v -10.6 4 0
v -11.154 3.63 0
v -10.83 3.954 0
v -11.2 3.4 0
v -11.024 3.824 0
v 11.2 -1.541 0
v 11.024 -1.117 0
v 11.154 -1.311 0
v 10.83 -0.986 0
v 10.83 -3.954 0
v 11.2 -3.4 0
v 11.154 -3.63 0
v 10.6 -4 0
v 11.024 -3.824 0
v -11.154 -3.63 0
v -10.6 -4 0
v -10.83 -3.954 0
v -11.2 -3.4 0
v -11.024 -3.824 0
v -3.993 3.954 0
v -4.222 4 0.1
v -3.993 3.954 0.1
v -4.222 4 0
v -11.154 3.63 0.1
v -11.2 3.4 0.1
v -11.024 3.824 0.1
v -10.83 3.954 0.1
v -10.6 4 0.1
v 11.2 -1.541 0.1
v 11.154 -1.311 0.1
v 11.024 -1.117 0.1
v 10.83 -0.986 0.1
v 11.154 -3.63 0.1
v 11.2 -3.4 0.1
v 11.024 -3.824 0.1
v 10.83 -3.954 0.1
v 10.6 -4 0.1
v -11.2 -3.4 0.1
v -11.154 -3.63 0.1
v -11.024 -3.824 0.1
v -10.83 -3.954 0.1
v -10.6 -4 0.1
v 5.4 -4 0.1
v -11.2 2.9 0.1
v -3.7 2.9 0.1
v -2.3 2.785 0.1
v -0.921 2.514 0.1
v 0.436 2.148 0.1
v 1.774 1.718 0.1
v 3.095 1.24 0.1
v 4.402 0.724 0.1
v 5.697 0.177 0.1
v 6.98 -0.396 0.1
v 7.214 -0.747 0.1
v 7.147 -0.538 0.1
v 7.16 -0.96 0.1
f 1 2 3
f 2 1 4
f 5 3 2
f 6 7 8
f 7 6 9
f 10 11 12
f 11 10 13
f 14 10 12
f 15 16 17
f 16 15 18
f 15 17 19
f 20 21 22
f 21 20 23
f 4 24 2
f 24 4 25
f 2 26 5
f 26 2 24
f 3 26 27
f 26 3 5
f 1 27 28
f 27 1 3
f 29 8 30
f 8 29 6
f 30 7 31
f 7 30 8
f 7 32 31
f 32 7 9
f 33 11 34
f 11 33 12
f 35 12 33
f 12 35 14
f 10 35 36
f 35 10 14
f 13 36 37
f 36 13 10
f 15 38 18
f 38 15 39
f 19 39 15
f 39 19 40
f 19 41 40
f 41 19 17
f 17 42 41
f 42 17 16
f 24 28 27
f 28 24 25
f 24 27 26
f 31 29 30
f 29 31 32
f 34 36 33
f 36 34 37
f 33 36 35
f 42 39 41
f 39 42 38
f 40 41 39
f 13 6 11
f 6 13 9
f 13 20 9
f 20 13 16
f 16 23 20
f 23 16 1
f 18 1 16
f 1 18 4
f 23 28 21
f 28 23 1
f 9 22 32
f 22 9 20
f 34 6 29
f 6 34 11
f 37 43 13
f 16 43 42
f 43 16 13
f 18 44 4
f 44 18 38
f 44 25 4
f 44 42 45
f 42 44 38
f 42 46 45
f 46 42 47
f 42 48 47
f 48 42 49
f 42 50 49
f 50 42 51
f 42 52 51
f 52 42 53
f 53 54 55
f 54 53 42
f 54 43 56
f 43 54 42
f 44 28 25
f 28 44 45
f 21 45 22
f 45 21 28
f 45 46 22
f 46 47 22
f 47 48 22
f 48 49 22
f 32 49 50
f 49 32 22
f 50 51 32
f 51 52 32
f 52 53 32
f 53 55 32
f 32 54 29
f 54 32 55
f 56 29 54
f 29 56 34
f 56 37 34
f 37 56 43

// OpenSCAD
// file: ../p/empty.scad
use <../lib.scad>
function ldraw_lib__empty() = [
// 0 Empty
// 0 Name: empty.dat
// 0 Author: Steffen [Steffen]
// 0 !LDRAW_ORG Primitive UPDATE 2015-01
// 0 !LICENSE Licensed under CC BY 4.0 : see CAreadme.txt
// 
// 0 BFC CERTIFY CCW
  [0,"BFC","CERTIFY"],
  [0,"BFC","CCW"],
// 
// 0 !HISTORY 2015-10-11 [PTadmin] Official Update 2015-01
// 
// 
// 0 // Tool MLCad cannot handle really empty files. This file is used as a workaround.
// 0 // It exceptionally contains forbidden non-LDRAW standard syntax to satisfy MLCad until it is fixed OR a different editor has become the de-facto LDRAW standard.
// 0 // The line being used here is an "impossible" conditional line which never should be visible,
// 0 // additionally hidden by a syntax explicitly hiding it from displaying.
// 
// 0 MLCAD HIDE 5 24 0 0 0 0.0001 0 0 0.0001 -0.0001 0 0 0 0
];
module ldraw_lib__empty(step=0, col=false, unit=2/5, alt=false, line=0.2, solid=!$preview)
    makepoly(ldraw_lib__empty(), step=step, col=col, unit=unit, alt=alt, line=line, solid=solid);
ldraw_lib__empty(line=0.2);
// file: ../p/3-16cyli.scad
use <../lib.scad>
function ldraw_lib__3_16cyli() = [
// 0 Cylinder 0.1875
// 0 Name: 3-16cyli.dat
// 0 Author: Mark Kennedy [mkennedy]
// 0 !LDRAW_ORG Primitive UPDATE 2005-01
// 0 !LICENSE Licensed under CC BY 4.0 : see CAreadme.txt
// 
// 0 BFC CERTIFY CCW
  [0,"BFC","CERTIFY"],
  [0,"BFC","CCW"],
// 
// 0 !HISTORY 2004-03-02 [PTadmin] Official Update 2004-01
// 0 !HISTORY 2004-12-11 [nielsk] Recreated using Primitive Generator, Edge lines fixed, BFC changed to CCW
// 0 !HISTORY 2005-12-28 [PTadmin] Official Update 2005-01
// 0 !HISTORY 2007-06-24 [PTadmin] Header formatted for Contributor Agreement
// 0 !HISTORY 2008-07-01 [PTadmin] Official Update 2008-01
// 
// 
// 4 16 .9239 1 .3827 .9239 0 .3827 1 0 0 1 1 0
  [4,16,.9239,1,.3827,.9239,0,.3827,1,0,0,1,1,0],
// 4 16 .7071 1 .7071 .7071 0 .7071 .9239 0 .3827 .9239 1 .3827
  [4,16,.7071,1,.7071,.7071,0,.7071,.9239,0,.3827,.9239,1,.3827],
// 4 16 .3827 1 .9239 .3827 0 .9239 .7071 0 .7071 .7071 1 .7071
  [4,16,.3827,1,.9239,.3827,0,.9239,.7071,0,.7071,.7071,1,.7071],
// 5 24 1 1 0 1 0 0 1 1 -.4142 .9239 1 .3827
  [5,24,1,1,0,1,0,0,1,1,-.4142,.9239,1,.3827],
// 5 24 .9239 1 .3827 .9239 0 .3827 1 1 0 .7071 1 .7071
  [5,24,.9239,1,.3827,.9239,0,.3827,1,1,0,.7071,1,.7071],
// 5 24 .7071 1 .7071 .7071 0 .7071 .9239 1 .3827 .3827 1 .9239
  [5,24,.7071,1,.7071,.7071,0,.7071,.9239,1,.3827,.3827,1,.9239],
// 5 24 .3827 1 .9239 .3827 0 .9239 .7071 1 .7071 0 1 1.0824
  [5,24,.3827,1,.9239,.3827,0,.9239,.7071,1,.7071,0,1,1.0824],
// 0
];
module ldraw_lib__3_16cyli(step=0, col=false, unit=2/5, alt=false, line=0.2, solid=!$preview)
    makepoly(ldraw_lib__3_16cyli(), step=step, col=col, unit=unit, alt=alt, line=line, solid=solid);
ldraw_lib__3_16cyli(line=0.2);
// file: ../p/3-16chrd.scad
use <../lib.scad>
function ldraw_lib__3_16chrd() = [
// 0 Chord 0.1875
// 0 Name: 3-16chrd.dat
// 0 Author: Niels Karsdorp [nielsk]
// 0 !LDRAW_ORG Primitive UPDATE 2009-01
// 0 !LICENSE Licensed under CC BY 4.0 : see CAreadme.txt
// 
// 0 BFC CERTIFY CCW
  [0,"BFC","CERTIFY"],
  [0,"BFC","CCW"],
// 
// 0 !HISTORY 2009-05-02 [PTadmin] Official Update 2009-01
// 
// 
// 4 16 1 0 0 0.9239 0 0.3827 0.7071 0 0.7071 0.3827 0 0.9239
  [4,16,1,0,0,0.9239,0,0.3827,0.7071,0,0.7071,0.3827,0,0.9239],
// 0
// 
];
module ldraw_lib__3_16chrd(step=0, col=false, unit=2/5, alt=false, line=0.2, solid=!$preview)
    makepoly(ldraw_lib__3_16chrd(), step=step, col=col, unit=unit, alt=alt, line=line, solid=solid);
ldraw_lib__3_16chrd(line=0.2);
// file: ../p/1-4cyli.scad
use <../lib.scad>
function ldraw_lib__1_4cyli() = [
// 0 Cylinder 0.25
// 0 Name: 1-4cyli.dat
// 0 Author: James Jessiman
// 0 !LDRAW_ORG Primitive UPDATE 2012-01
// 0 !LICENSE Licensed under CC BY 4.0 : see CAreadme.txt
// 
// 0 BFC CERTIFY CCW
  [0,"BFC","CERTIFY"],
  [0,"BFC","CCW"],
// 
// 0 !HISTORY 2002-03-23 [sbliss] Added BFC statement.
// 0 !HISTORY 2002-04-25 [PTadmin] Official Update 2002-02
// 0 !HISTORY 2007-06-22 [PTadmin] Header formatted for Contributor Agreement
// 0 !HISTORY 2008-07-01 [PTadmin] Official Update 2008-01
// 0 !HISTORY 2012-02-16 [Philo] Changed to CCW
// 0 !HISTORY 2012-03-30 [PTadmin] Official Update 2012-01
// 
// 
// 4 16 1 1 0 0.9239 1 0.3827 0.9239 0 0.3827 1 0 0
  [4,16,1,1,0,0.9239,1,0.3827,0.9239,0,0.3827,1,0,0],
// 5 24 1 0 0 1 1 0 0.9239 0 0.3827 1 0 -1
  [5,24,1,0,0,1,1,0,0.9239,0,0.3827,1,0,-1],
// 4 16 0.9239 1 0.3827 0.7071 1 0.7071 0.7071 0 0.7071 0.9239 0 0.3827
  [4,16,0.9239,1,0.3827,0.7071,1,0.7071,0.7071,0,0.7071,0.9239,0,0.3827],
// 5 24 0.9239 0 0.3827 0.9239 1 0.3827 0.7071 0 0.7071 1 0 0
  [5,24,0.9239,0,0.3827,0.9239,1,0.3827,0.7071,0,0.7071,1,0,0],
// 4 16 0.7071 1 0.7071 0.3827 1 0.9239 0.3827 0 0.9239 0.7071 0 0.7071
  [4,16,0.7071,1,0.7071,0.3827,1,0.9239,0.3827,0,0.9239,0.7071,0,0.7071],
// 5 24 0.7071 0 0.7071 0.7071 1 0.7071 0.3827 0 0.9239 0.9239 0 0.3827
  [5,24,0.7071,0,0.7071,0.7071,1,0.7071,0.3827,0,0.9239,0.9239,0,0.3827],
// 4 16 0.3827 1 0.9239 0 1 1 0 0 1 0.3827 0 0.9239
  [4,16,0.3827,1,0.9239,0,1,1,0,0,1,0.3827,0,0.9239],
// 5 24 0.3827 0 0.9239 0.3827 1 0.9239 0 0 1 0.7071 0 0.7071
  [5,24,0.3827,0,0.9239,0.3827,1,0.9239,0,0,1,0.7071,0,0.7071],
// 5 24 0 0 1 0 1 1 0.3827 0 0.9239 -1 0 1
  [5,24,0,0,1,0,1,1,0.3827,0,0.9239,-1,0,1],
];
module ldraw_lib__1_4cyli(step=0, col=false, unit=2/5, alt=false, line=0.2, solid=!$preview)
    makepoly(ldraw_lib__1_4cyli(), step=step, col=col, unit=unit, alt=alt, line=line, solid=solid);
ldraw_lib__1_4cyli(line=0.2);
// file: ../p/1-4chrd.scad
use <../lib.scad>
function ldraw_lib__1_4chrd() = [
// 0 Chord 0.25
// 0 Name: 1-4chrd.dat
// 0 Author: Max Martin Richter [MMR1988]
// 0 !LDRAW_ORG Primitive UPDATE 2023-05
// 0 !LICENSE Licensed under CC BY 4.0 : see CAreadme.txt
// 
// 0 BFC CERTIFY CCW
  [0,"BFC","CERTIFY"],
  [0,"BFC","CCW"],
// 
// 0 !HISTORY 2004-04-22 [PTadmin] Official Update 2004-02
// 0 !HISTORY 2007-10-09 [PTadmin] Header formatted for Contributor Agreement
// 0 !HISTORY 2008-07-01 [PTadmin] Official Update 2008-01
// 0 !HISTORY 2012-08-02 [MMR1988] Re-creation with PrimGen2 and Rectifier
// 0 !HISTORY 2012-08-09 [PTadmin] Official Update 2012-02
// 0 !HISTORY 2023-10-27 [OrionP] Change author to MMR1988 from hafhead
// 0 !HISTORY 2023-10-31 [OrionP] Official Update 2023-05
// 
// 4 16 0.9239 0 0.3827 0.3827 0 0.9239 0 0 1 1 0 0
  [4,16,0.9239,0,0.3827,0.3827,0,0.9239,0,0,1,1,0,0],
// 3 16 0.7071 0 0.7071 0.3827 0 0.9239 0.9239 0 0.3827
  [3,16,0.7071,0,0.7071,0.3827,0,0.9239,0.9239,0,0.3827],
];
module ldraw_lib__1_4chrd(step=0, col=false, unit=2/5, alt=false, line=0.2, solid=!$preview)
    makepoly(ldraw_lib__1_4chrd(), step=step, col=col, unit=unit, alt=alt, line=line, solid=solid);
ldraw_lib__1_4chrd(line=0.2);
// file: ../p/1-16cyli.scad
use <../lib.scad>
function ldraw_lib__1_16cyli() = [
// 0 Cylinder 0.0625
// 0 Name: 1-16cyli.dat
// 0 Author: Marc Klein [marckl]
// 0 !LDRAW_ORG Primitive UPDATE 2005-01
// 0 !LICENSE Licensed under CC BY 4.0 : see CAreadme.txt
// 
// 0 BFC CERTIFY CCW
  [0,"BFC","CERTIFY"],
  [0,"BFC","CCW"],
// 
// 0 !HISTORY 2004-03-02 [PTadmin] Official Update 2004-01
// 0 !HISTORY 2004-12-11 [nielsk] Recreated using Primitive Generator, Edge lines fixed, BFC changed to CCW
// 0 !HISTORY 2005-12-28 [PTadmin] Official Update 2005-01
// 0 !HISTORY 2007-06-22 [PTadmin] Header formatted for Contributor Agreement
// 0 !HISTORY 2008-07-01 [PTadmin] Official Update 2008-01
// 
// 
// 4 16 .9239 1 .3827 .9239 0 .3827 1 0 0 1 1 0
  [4,16,.9239,1,.3827,.9239,0,.3827,1,0,0,1,1,0],
// 5 24 1 1 0 1 0 0 1 1 -.4142 .9239 1 .3827
  [5,24,1,1,0,1,0,0,1,1,-.4142,.9239,1,.3827],
// 5 24 .9239 1 .3827 .9239 0 .3827 1 1 0 .7654 1 .7654
  [5,24,.9239,1,.3827,.9239,0,.3827,1,1,0,.7654,1,.7654],
// 0
];
module ldraw_lib__1_16cyli(step=0, col=false, unit=2/5, alt=false, line=0.2, solid=!$preview)
    makepoly(ldraw_lib__1_16cyli(), step=step, col=col, unit=unit, alt=alt, line=line, solid=solid);
ldraw_lib__1_16cyli(line=0.2);
// file: ../p/1-16chrd.scad
use <../lib.scad>
use <empty.scad>
function ldraw_lib__1_16chrd() = [
// 0 Chord 0.0625
// 0 Name: 1-16chrd.dat
// 0 Author: Philippe Hurbain [Philo]
// 0 !LDRAW_ORG Primitive UPDATE 2015-01
// 0 !LICENSE Licensed under CC BY 4.0 : see CAreadme.txt
// 
// 0 BFC CERTIFY CCW
  [0,"BFC","CERTIFY"],
  [0,"BFC","CCW"],
// 
// 0 !HISTORY 2015-10-11 [PTadmin] Official Update 2015-01
// 
// 
// 0 // This file is intentionally empty because at the current \P resolution,
// 0 // an 1-16chrd is actually empty. However, this file still is present
// 0 // to allow tools to do primitives substition and fill in a real chrd here,
// 0 // or, if desired, to substitute this with the hi-res 48\1-16chrd.
// 
// 0 // This file is based on an idea by Darats at http://forums.ldraw.org/read.php?19,14500,14500#msg-14500
// 
// 1 16 0 0 0 1 0 0 0 1 0 0 0 1 empty.dat
  [1,16,0,0,0,1,0,0,0,1,0,0,0,1, ldraw_lib__empty()],
];
module ldraw_lib__1_16chrd(step=0, col=false, unit=2/5, alt=false, line=0.2, solid=!$preview)
    makepoly(ldraw_lib__1_16chrd(), step=step, col=col, unit=unit, alt=alt, line=line, solid=solid);
ldraw_lib__1_16chrd(line=0.2);
// file: 6141955q.scad
use <../lib.scad>
use <../p/1-16chrd.scad>
use <../p/1-16cyli.scad>
use <../p/1-4chrd.scad>
use <../p/1-4cyli.scad>
use <../p/3-16chrd.scad>
use <../p/3-16cyli.scad>
function ldraw_lib__6141955q() = [
// 0 Sticker  1 x  2.8 with Black Trapezoid on Blue Background Right
// 0 Name: 6141955q.dat
// 0 Author: Massimo Maso [Sirio]
// 0 !LDRAW_ORG Part UPDATE 2025-03
// 0 !LICENSE Licensed under CC BY 4.0 : see CAreadme.txt
// 
// 0 BFC CERTIFY CCW
  [0,"BFC","CERTIFY"],
  [0,"BFC","CCW"],
// 
// 0 !KEYWORDS Bricklink 75871stk01a, Brickowl 197362, Ford, GT, Mustang
// 0 !KEYWORDS Rebrickable 24746, Set 75871, Speed Champions
// 
// 0 !HISTORY 2025-03-30 [OrionP] Official Update 2025-03
// 
// 0 // Primitives
// 1 16 10.55615 0 8.5 0 0 -1.5 0 -1 0 1.5 0 0 1-16chrd.dat
  [1,16,10.55615,0,8.5,0,0,-1.5,0,-1,0,1.5,0,0, ldraw_lib__1_16chrd()],
// 1 16 26.5 0 8.5 1.5 0 0 0 -1 0 0 0 1.5 1-4chrd.dat
  [1,16,26.5,0,8.5,1.5,0,0,0,-1,0,0,0,1.5, ldraw_lib__1_4chrd()],
// 1 16 -26.5 0 -3.85205 -1.5 0 0 0 -1 0 0 0 1.5 3-16chrd.dat
  [1,16,-26.5,0,-3.85205,-1.5,0,0,0,-1,0,0,0,1.5, ldraw_lib__3_16chrd()],
// 1 16 -26.5 0 -8.5 -1.5 0 0 0 -1 0 0 0 -1.5 1-4chrd.dat
  [1,16,-26.5,0,-8.5,-1.5,0,0,0,-1,0,0,0,-1.5, ldraw_lib__1_4chrd()],
// 1 16 26.5 0 -8.5 1.5 0 0 0 -1 0 0 0 -1.5 1-4chrd.dat
  [1,16,26.5,0,-8.5,1.5,0,0,0,-1,0,0,0,-1.5, ldraw_lib__1_4chrd()],
// 1 16 10.55615 0 8.5 0 0 -1.5 0 -.25 0 1.5 0 0 1-16cyli.dat
  [1,16,10.55615,0,8.5,0,0,-1.5,0,-.25,0,1.5,0,0, ldraw_lib__1_16cyli()],
// 1 16 26.5 0 8.5 1.5 0 0 0 -.25 0 0 0 1.5 1-4cyli.dat
  [1,16,26.5,0,8.5,1.5,0,0,0,-.25,0,0,0,1.5, ldraw_lib__1_4cyli()],
// 1 16 -26.5 0 -3.85205 -1.5 0 0 0 -.25 0 0 0 1.5 3-16cyli.dat
  [1,16,-26.5,0,-3.85205,-1.5,0,0,0,-.25,0,0,0,1.5, ldraw_lib__3_16cyli()],
// 1 16 -26.5 0 -8.5 -1.5 0 0 0 -.25 0 0 0 -1.5 1-4cyli.dat
  [1,16,-26.5,0,-8.5,-1.5,0,0,0,-.25,0,0,0,-1.5, ldraw_lib__1_4cyli()],
// 1 16 26.5 0 -8.5 1.5 0 0 0 -.25 0 0 0 -1.5 1-4cyli.dat
  [1,16,26.5,0,-8.5,1.5,0,0,0,-.25,0,0,0,-1.5, ldraw_lib__1_4cyli()],
// 1 1 10.55615 -.25 8.5 0 0 -1.5 0 1 0 1.5 0 0 1-16chrd.dat
  [1,1,10.55615,-.25,8.5,0,0,-1.5,0,1,0,1.5,0,0, ldraw_lib__1_16chrd()],
// 1 1 26.5 -.25 8.5 1.5 0 0 0 1 0 0 0 1.5 1-4chrd.dat
  [1,1,26.5,-.25,8.5,1.5,0,0,0,1,0,0,0,1.5, ldraw_lib__1_4chrd()],
// 1 1 -26.5 -.25 -3.85205 -1.5 0 0 0 1 0 0 0 1.5 3-16chrd.dat
  [1,1,-26.5,-.25,-3.85205,-1.5,0,0,0,1,0,0,0,1.5, ldraw_lib__3_16chrd()],
// 1 1 -26.5 -.25 -8.5 -1.5 0 0 0 1 0 0 0 -1.5 1-4chrd.dat
  [1,1,-26.5,-.25,-8.5,-1.5,0,0,0,1,0,0,0,-1.5, ldraw_lib__1_4chrd()],
// 1 0 26.5 -.25 -8.5 1.5 0 0 0 1 0 0 0 -1.5 1-4chrd.dat
  [1,0,26.5,-.25,-8.5,1.5,0,0,0,1,0,0,0,-1.5, ldraw_lib__1_4chrd()],
// 0 // Bottom face
// 4 16 -26.5 0 -10 -28 0 -8.5 -28 0 -3.85205 -27.07405 0 -2.4662
  [4,16,-26.5,0,-10,-28,0,-8.5,-28,0,-3.85205,-27.07405,0,-2.4662],
// 4 16 -26.5 0 -10 -27.07405 0 -2.4662 9.9821 0 9.88585 26.5 0 -10
  [4,16,-26.5,0,-10,-27.07405,0,-2.4662,9.9821,0,9.88585,26.5,0,-10],
// 4 16 26.5 0 -10 9.9821 0 9.88585 10.55615 0 10 26.5 0 10
  [4,16,26.5,0,-10,9.9821,0,9.88585,10.55615,0,10,26.5,0,10],
// 4 16 26.5 0 -10 26.5 0 10 28 0 8.5 28 0 -8.5
  [4,16,26.5,0,-10,26.5,0,10,28,0,8.5,28,0,-8.5],
// 0 // Lateral face
// 4 16 26.5 0 10 10.55615 0 10 10.55615 -.25 10 26.5 -.25 10
  [4,16,26.5,0,10,10.55615,0,10,10.55615,-.25,10,26.5,-.25,10],
// 4 16 9.9821 0 9.88585 -27.07405 0 -2.4662 -27.07405 -.25 -2.4662 9.9821 -.25 9.88585
  [4,16,9.9821,0,9.88585,-27.07405,0,-2.4662,-27.07405,-.25,-2.4662,9.9821,-.25,9.88585],
// 4 16 -28 0 -3.85205 -28 0 -8.5 -28 -.25 -8.5 -28 -.25 -3.85205
  [4,16,-28,0,-3.85205,-28,0,-8.5,-28,-.25,-8.5,-28,-.25,-3.85205],
// 3 16 -26.5 0 -10 -13.5 -.25 -10 -26.5 -.25 -10
  [3,16,-26.5,0,-10,-13.5,-.25,-10,-26.5,-.25,-10],
// 4 16 -26.5 0 -10 26.5 0 -10 26.5 -.25 -10 -13.5 -.25 -10
  [4,16,-26.5,0,-10,26.5,0,-10,26.5,-.25,-10,-13.5,-.25,-10],
// 4 16 28 0 8.5 28 -.25 7.25 28 -.25 -8.5 28 0 -8.5
  [4,16,28,0,8.5,28,-.25,7.25,28,-.25,-8.5,28,0,-8.5],
// 3 16 28 0 8.5 28 -.25 8.5 28 -.25 7.25
  [3,16,28,0,8.5,28,-.25,8.5,28,-.25,7.25],
// 0 // Conditional lines
// 5 24 9.9821 -.25 9.8859 9.9821 0 9.8859 10.5562 -.25 10 -27.0741 -.25 -2.4662
  [5,24,9.9821,-.25,9.8859,9.9821,0,9.8859,10.5562,-.25,10,-27.0741,-.25,-2.4662],
// 5 24 -27.0741 -.25 -2.4662 -27.0741 0 -2.4662 -27.5607 -.25 -2.7914 9.9821 -.25 9.8859
  [5,24,-27.0741,-.25,-2.4662,-27.0741,0,-2.4662,-27.5607,-.25,-2.7914,9.9821,-.25,9.8859],
// 0 // Top face
// 0 // Black faces
// 4 0 26.5 -.25 -10 28 -.25 -8.5 28 -.25 7.25 9.25 -.25 7.25
  [4,0,26.5,-.25,-10,28,-.25,-8.5,28,-.25,7.25,9.25,-.25,7.25],
// 4 0 26.5 -.25 -10 9.25 -.25 7.25 5.7488 -.25 6.9618 2.3016 -.25 6.2847
  [4,0,26.5,-.25,-10,9.25,-.25,7.25,5.7488,-.25,6.9618,2.3016,-.25,6.2847],
// 4 0 26.5 -.25 -10 2.3016 -.25 6.2847 -1.0907 -.25 5.3712 -4.435 -.25 4.2954
  [4,0,26.5,-.25,-10,2.3016,-.25,6.2847,-1.0907,-.25,5.3712,-4.435,-.25,4.2954],
// 4 0 26.5 -.25 -10 -4.435 -.25 4.2954 -7.7382 -.25 3.0992 -11.0057 -.25 1.8089
  [4,0,26.5,-.25,-10,-4.435,-.25,4.2954,-7.7382,-.25,3.0992,-11.0057,-.25,1.8089],
// 4 0 26.5 -.25 -10 -11.0057 -.25 1.8089 -14.2419 -.25 .4418 -17.4502 -.25 -.9894
  [4,0,26.5,-.25,-10,-11.0057,-.25,1.8089,-14.2419,-.25,.4418,-17.4502,-.25,-.9894],
// 4 0 26.5 -.25 -10 -17.4502 -.25 -.9894 -17.8674 -.25 -1.3455 -18.0341 -.25 -1.8681
  [4,0,26.5,-.25,-10,-17.4502,-.25,-.9894,-17.8674,-.25,-1.3455,-18.0341,-.25,-1.8681],
// 4 0 26.5 -.25 -10 -18.0341 -.25 -1.8681 -17.9 -.25 -2.4 -13.5 -.25 -10
  [4,0,26.5,-.25,-10,-18.0341,-.25,-1.8681,-17.9,-.25,-2.4,-13.5,-.25,-10],
// 0 // Blue faces
// 4 1 26.5 -.25 10 9.25 -.25 7.25 28 -.25 7.25 28 -.25 8.5
  [4,1,26.5,-.25,10,9.25,-.25,7.25,28,-.25,7.25,28,-.25,8.5],
// 4 1 26.5 -.25 10 10.55615 -.25 10 9.9821 -.25 9.88585 9.25 -.25 7.25
  [4,1,26.5,-.25,10,10.55615,-.25,10,9.9821,-.25,9.88585,9.25,-.25,7.25],
// 3 1 9.9821 -.25 9.88585 5.7488 -.25 6.9618 9.25 -.25 7.25
  [3,1,9.9821,-.25,9.88585,5.7488,-.25,6.9618,9.25,-.25,7.25],
// 3 1 9.9821 -.25 9.88585 2.3016 -.25 6.2847 5.7488 -.25 6.9618
  [3,1,9.9821,-.25,9.88585,2.3016,-.25,6.2847,5.7488,-.25,6.9618],
// 3 1 9.9821 -.25 9.88585 -1.0907 -.25 5.3712 2.3016 -.25 6.2847
  [3,1,9.9821,-.25,9.88585,-1.0907,-.25,5.3712,2.3016,-.25,6.2847],
// 3 1 9.9821 -.25 9.88585 -4.435 -.25 4.2954 -1.0907 -.25 5.3712
  [3,1,9.9821,-.25,9.88585,-4.435,-.25,4.2954,-1.0907,-.25,5.3712],
// 4 1 9.9821 -.25 9.88585 -27.07405 -.25 -2.4662 -7.7382 -.25 3.0992 -4.435 -.25 4.2954
  [4,1,9.9821,-.25,9.88585,-27.07405,-.25,-2.4662,-7.7382,-.25,3.0992,-4.435,-.25,4.2954],
// 3 1 -27.07405 -.25 -2.4662 -11.0057 -.25 1.8089 -7.7382 -.25 3.0992
  [3,1,-27.07405,-.25,-2.4662,-11.0057,-.25,1.8089,-7.7382,-.25,3.0992],
// 3 1 -27.07405 -.25 -2.4662 -14.2419 -.25 .4418 -11.0057 -.25 1.8089
  [3,1,-27.07405,-.25,-2.4662,-14.2419,-.25,.4418,-11.0057,-.25,1.8089],
// 3 1 -27.07405 -.25 -2.4662 -17.4502 -.25 -.9894 -14.2419 -.25 .4418
  [3,1,-27.07405,-.25,-2.4662,-17.4502,-.25,-.9894,-14.2419,-.25,.4418],
// 3 1 -27.07405 -.25 -2.4662 -17.8674 -.25 -1.3455 -17.4502 -.25 -.9894
  [3,1,-27.07405,-.25,-2.4662,-17.8674,-.25,-1.3455,-17.4502,-.25,-.9894],
// 4 1 -27.07405 -.25 -2.4662 -28 -.25 -3.85205 -18.0341 -.25 -1.8681 -17.8674 -.25 -1.3455
  [4,1,-27.07405,-.25,-2.4662,-28,-.25,-3.85205,-18.0341,-.25,-1.8681,-17.8674,-.25,-1.3455],
// 4 1 -28 -.25 -8.5 -17.9 -.25 -2.4 -18.0341 -.25 -1.8681 -28 -.25 -3.85205
  [4,1,-28,-.25,-8.5,-17.9,-.25,-2.4,-18.0341,-.25,-1.8681,-28,-.25,-3.85205],
// 4 1 -28 -.25 -8.5 -26.5 -.25 -10 -13.5 -.25 -10 -17.9 -.25 -2.4
  [4,1,-28,-.25,-8.5,-26.5,-.25,-10,-13.5,-.25,-10,-17.9,-.25,-2.4],
];
module ldraw_lib__6141955q(step=0, col=false, unit=2/5, alt=false, line=0.2, solid=!$preview)
    makepoly(ldraw_lib__6141955q(), step=step, col=col, unit=unit, alt=alt, line=line, solid=solid);
ldraw_lib__6141955q(line=0.2);
// main file
use <../lib.scad>
use <6141955q.scad>
function ldraw_lib__6141955s() = [
// 0 Sticker  1 x  2.8 with Black Trapezoid on Blue Background Left
// 0 Name: 6141955s.dat
// 0 Author: Massimo Maso [Sirio]
// 0 !LDRAW_ORG Part UPDATE 2025-03
// 0 !LICENSE Licensed under CC BY 4.0 : see CAreadme.txt
// 
// 0 BFC CERTIFY CCW
  [0,"BFC","CERTIFY"],
  [0,"BFC","CCW"],
// 
// 0 !KEYWORDS Bricklink 75871stk01a, Brickowl 197362, Ford, GT, Mustang
// 0 !KEYWORDS Rebrickable 24746, Set 75871, Speed Champions
// 
// 0 !HISTORY 2025-03-30 [OrionP] Official Update 2025-03
// 
// 1 16 0 0 0 -1 0 0 0 1 0 0 0 1 6141955q.dat
  [1,16,0,0,0,-1,0,0,0,1,0,0,0,1, ldraw_lib__6141955q()],
// 
];
module ldraw_lib__6141955s(step=0, col=false, unit=2/5, alt=false, line=0.2, solid=!$preview)
    makepoly(ldraw_lib__6141955s(), step=step, col=col, unit=unit, alt=alt, line=line, solid=solid);
ldraw_lib__6141955s(line=0.2);
